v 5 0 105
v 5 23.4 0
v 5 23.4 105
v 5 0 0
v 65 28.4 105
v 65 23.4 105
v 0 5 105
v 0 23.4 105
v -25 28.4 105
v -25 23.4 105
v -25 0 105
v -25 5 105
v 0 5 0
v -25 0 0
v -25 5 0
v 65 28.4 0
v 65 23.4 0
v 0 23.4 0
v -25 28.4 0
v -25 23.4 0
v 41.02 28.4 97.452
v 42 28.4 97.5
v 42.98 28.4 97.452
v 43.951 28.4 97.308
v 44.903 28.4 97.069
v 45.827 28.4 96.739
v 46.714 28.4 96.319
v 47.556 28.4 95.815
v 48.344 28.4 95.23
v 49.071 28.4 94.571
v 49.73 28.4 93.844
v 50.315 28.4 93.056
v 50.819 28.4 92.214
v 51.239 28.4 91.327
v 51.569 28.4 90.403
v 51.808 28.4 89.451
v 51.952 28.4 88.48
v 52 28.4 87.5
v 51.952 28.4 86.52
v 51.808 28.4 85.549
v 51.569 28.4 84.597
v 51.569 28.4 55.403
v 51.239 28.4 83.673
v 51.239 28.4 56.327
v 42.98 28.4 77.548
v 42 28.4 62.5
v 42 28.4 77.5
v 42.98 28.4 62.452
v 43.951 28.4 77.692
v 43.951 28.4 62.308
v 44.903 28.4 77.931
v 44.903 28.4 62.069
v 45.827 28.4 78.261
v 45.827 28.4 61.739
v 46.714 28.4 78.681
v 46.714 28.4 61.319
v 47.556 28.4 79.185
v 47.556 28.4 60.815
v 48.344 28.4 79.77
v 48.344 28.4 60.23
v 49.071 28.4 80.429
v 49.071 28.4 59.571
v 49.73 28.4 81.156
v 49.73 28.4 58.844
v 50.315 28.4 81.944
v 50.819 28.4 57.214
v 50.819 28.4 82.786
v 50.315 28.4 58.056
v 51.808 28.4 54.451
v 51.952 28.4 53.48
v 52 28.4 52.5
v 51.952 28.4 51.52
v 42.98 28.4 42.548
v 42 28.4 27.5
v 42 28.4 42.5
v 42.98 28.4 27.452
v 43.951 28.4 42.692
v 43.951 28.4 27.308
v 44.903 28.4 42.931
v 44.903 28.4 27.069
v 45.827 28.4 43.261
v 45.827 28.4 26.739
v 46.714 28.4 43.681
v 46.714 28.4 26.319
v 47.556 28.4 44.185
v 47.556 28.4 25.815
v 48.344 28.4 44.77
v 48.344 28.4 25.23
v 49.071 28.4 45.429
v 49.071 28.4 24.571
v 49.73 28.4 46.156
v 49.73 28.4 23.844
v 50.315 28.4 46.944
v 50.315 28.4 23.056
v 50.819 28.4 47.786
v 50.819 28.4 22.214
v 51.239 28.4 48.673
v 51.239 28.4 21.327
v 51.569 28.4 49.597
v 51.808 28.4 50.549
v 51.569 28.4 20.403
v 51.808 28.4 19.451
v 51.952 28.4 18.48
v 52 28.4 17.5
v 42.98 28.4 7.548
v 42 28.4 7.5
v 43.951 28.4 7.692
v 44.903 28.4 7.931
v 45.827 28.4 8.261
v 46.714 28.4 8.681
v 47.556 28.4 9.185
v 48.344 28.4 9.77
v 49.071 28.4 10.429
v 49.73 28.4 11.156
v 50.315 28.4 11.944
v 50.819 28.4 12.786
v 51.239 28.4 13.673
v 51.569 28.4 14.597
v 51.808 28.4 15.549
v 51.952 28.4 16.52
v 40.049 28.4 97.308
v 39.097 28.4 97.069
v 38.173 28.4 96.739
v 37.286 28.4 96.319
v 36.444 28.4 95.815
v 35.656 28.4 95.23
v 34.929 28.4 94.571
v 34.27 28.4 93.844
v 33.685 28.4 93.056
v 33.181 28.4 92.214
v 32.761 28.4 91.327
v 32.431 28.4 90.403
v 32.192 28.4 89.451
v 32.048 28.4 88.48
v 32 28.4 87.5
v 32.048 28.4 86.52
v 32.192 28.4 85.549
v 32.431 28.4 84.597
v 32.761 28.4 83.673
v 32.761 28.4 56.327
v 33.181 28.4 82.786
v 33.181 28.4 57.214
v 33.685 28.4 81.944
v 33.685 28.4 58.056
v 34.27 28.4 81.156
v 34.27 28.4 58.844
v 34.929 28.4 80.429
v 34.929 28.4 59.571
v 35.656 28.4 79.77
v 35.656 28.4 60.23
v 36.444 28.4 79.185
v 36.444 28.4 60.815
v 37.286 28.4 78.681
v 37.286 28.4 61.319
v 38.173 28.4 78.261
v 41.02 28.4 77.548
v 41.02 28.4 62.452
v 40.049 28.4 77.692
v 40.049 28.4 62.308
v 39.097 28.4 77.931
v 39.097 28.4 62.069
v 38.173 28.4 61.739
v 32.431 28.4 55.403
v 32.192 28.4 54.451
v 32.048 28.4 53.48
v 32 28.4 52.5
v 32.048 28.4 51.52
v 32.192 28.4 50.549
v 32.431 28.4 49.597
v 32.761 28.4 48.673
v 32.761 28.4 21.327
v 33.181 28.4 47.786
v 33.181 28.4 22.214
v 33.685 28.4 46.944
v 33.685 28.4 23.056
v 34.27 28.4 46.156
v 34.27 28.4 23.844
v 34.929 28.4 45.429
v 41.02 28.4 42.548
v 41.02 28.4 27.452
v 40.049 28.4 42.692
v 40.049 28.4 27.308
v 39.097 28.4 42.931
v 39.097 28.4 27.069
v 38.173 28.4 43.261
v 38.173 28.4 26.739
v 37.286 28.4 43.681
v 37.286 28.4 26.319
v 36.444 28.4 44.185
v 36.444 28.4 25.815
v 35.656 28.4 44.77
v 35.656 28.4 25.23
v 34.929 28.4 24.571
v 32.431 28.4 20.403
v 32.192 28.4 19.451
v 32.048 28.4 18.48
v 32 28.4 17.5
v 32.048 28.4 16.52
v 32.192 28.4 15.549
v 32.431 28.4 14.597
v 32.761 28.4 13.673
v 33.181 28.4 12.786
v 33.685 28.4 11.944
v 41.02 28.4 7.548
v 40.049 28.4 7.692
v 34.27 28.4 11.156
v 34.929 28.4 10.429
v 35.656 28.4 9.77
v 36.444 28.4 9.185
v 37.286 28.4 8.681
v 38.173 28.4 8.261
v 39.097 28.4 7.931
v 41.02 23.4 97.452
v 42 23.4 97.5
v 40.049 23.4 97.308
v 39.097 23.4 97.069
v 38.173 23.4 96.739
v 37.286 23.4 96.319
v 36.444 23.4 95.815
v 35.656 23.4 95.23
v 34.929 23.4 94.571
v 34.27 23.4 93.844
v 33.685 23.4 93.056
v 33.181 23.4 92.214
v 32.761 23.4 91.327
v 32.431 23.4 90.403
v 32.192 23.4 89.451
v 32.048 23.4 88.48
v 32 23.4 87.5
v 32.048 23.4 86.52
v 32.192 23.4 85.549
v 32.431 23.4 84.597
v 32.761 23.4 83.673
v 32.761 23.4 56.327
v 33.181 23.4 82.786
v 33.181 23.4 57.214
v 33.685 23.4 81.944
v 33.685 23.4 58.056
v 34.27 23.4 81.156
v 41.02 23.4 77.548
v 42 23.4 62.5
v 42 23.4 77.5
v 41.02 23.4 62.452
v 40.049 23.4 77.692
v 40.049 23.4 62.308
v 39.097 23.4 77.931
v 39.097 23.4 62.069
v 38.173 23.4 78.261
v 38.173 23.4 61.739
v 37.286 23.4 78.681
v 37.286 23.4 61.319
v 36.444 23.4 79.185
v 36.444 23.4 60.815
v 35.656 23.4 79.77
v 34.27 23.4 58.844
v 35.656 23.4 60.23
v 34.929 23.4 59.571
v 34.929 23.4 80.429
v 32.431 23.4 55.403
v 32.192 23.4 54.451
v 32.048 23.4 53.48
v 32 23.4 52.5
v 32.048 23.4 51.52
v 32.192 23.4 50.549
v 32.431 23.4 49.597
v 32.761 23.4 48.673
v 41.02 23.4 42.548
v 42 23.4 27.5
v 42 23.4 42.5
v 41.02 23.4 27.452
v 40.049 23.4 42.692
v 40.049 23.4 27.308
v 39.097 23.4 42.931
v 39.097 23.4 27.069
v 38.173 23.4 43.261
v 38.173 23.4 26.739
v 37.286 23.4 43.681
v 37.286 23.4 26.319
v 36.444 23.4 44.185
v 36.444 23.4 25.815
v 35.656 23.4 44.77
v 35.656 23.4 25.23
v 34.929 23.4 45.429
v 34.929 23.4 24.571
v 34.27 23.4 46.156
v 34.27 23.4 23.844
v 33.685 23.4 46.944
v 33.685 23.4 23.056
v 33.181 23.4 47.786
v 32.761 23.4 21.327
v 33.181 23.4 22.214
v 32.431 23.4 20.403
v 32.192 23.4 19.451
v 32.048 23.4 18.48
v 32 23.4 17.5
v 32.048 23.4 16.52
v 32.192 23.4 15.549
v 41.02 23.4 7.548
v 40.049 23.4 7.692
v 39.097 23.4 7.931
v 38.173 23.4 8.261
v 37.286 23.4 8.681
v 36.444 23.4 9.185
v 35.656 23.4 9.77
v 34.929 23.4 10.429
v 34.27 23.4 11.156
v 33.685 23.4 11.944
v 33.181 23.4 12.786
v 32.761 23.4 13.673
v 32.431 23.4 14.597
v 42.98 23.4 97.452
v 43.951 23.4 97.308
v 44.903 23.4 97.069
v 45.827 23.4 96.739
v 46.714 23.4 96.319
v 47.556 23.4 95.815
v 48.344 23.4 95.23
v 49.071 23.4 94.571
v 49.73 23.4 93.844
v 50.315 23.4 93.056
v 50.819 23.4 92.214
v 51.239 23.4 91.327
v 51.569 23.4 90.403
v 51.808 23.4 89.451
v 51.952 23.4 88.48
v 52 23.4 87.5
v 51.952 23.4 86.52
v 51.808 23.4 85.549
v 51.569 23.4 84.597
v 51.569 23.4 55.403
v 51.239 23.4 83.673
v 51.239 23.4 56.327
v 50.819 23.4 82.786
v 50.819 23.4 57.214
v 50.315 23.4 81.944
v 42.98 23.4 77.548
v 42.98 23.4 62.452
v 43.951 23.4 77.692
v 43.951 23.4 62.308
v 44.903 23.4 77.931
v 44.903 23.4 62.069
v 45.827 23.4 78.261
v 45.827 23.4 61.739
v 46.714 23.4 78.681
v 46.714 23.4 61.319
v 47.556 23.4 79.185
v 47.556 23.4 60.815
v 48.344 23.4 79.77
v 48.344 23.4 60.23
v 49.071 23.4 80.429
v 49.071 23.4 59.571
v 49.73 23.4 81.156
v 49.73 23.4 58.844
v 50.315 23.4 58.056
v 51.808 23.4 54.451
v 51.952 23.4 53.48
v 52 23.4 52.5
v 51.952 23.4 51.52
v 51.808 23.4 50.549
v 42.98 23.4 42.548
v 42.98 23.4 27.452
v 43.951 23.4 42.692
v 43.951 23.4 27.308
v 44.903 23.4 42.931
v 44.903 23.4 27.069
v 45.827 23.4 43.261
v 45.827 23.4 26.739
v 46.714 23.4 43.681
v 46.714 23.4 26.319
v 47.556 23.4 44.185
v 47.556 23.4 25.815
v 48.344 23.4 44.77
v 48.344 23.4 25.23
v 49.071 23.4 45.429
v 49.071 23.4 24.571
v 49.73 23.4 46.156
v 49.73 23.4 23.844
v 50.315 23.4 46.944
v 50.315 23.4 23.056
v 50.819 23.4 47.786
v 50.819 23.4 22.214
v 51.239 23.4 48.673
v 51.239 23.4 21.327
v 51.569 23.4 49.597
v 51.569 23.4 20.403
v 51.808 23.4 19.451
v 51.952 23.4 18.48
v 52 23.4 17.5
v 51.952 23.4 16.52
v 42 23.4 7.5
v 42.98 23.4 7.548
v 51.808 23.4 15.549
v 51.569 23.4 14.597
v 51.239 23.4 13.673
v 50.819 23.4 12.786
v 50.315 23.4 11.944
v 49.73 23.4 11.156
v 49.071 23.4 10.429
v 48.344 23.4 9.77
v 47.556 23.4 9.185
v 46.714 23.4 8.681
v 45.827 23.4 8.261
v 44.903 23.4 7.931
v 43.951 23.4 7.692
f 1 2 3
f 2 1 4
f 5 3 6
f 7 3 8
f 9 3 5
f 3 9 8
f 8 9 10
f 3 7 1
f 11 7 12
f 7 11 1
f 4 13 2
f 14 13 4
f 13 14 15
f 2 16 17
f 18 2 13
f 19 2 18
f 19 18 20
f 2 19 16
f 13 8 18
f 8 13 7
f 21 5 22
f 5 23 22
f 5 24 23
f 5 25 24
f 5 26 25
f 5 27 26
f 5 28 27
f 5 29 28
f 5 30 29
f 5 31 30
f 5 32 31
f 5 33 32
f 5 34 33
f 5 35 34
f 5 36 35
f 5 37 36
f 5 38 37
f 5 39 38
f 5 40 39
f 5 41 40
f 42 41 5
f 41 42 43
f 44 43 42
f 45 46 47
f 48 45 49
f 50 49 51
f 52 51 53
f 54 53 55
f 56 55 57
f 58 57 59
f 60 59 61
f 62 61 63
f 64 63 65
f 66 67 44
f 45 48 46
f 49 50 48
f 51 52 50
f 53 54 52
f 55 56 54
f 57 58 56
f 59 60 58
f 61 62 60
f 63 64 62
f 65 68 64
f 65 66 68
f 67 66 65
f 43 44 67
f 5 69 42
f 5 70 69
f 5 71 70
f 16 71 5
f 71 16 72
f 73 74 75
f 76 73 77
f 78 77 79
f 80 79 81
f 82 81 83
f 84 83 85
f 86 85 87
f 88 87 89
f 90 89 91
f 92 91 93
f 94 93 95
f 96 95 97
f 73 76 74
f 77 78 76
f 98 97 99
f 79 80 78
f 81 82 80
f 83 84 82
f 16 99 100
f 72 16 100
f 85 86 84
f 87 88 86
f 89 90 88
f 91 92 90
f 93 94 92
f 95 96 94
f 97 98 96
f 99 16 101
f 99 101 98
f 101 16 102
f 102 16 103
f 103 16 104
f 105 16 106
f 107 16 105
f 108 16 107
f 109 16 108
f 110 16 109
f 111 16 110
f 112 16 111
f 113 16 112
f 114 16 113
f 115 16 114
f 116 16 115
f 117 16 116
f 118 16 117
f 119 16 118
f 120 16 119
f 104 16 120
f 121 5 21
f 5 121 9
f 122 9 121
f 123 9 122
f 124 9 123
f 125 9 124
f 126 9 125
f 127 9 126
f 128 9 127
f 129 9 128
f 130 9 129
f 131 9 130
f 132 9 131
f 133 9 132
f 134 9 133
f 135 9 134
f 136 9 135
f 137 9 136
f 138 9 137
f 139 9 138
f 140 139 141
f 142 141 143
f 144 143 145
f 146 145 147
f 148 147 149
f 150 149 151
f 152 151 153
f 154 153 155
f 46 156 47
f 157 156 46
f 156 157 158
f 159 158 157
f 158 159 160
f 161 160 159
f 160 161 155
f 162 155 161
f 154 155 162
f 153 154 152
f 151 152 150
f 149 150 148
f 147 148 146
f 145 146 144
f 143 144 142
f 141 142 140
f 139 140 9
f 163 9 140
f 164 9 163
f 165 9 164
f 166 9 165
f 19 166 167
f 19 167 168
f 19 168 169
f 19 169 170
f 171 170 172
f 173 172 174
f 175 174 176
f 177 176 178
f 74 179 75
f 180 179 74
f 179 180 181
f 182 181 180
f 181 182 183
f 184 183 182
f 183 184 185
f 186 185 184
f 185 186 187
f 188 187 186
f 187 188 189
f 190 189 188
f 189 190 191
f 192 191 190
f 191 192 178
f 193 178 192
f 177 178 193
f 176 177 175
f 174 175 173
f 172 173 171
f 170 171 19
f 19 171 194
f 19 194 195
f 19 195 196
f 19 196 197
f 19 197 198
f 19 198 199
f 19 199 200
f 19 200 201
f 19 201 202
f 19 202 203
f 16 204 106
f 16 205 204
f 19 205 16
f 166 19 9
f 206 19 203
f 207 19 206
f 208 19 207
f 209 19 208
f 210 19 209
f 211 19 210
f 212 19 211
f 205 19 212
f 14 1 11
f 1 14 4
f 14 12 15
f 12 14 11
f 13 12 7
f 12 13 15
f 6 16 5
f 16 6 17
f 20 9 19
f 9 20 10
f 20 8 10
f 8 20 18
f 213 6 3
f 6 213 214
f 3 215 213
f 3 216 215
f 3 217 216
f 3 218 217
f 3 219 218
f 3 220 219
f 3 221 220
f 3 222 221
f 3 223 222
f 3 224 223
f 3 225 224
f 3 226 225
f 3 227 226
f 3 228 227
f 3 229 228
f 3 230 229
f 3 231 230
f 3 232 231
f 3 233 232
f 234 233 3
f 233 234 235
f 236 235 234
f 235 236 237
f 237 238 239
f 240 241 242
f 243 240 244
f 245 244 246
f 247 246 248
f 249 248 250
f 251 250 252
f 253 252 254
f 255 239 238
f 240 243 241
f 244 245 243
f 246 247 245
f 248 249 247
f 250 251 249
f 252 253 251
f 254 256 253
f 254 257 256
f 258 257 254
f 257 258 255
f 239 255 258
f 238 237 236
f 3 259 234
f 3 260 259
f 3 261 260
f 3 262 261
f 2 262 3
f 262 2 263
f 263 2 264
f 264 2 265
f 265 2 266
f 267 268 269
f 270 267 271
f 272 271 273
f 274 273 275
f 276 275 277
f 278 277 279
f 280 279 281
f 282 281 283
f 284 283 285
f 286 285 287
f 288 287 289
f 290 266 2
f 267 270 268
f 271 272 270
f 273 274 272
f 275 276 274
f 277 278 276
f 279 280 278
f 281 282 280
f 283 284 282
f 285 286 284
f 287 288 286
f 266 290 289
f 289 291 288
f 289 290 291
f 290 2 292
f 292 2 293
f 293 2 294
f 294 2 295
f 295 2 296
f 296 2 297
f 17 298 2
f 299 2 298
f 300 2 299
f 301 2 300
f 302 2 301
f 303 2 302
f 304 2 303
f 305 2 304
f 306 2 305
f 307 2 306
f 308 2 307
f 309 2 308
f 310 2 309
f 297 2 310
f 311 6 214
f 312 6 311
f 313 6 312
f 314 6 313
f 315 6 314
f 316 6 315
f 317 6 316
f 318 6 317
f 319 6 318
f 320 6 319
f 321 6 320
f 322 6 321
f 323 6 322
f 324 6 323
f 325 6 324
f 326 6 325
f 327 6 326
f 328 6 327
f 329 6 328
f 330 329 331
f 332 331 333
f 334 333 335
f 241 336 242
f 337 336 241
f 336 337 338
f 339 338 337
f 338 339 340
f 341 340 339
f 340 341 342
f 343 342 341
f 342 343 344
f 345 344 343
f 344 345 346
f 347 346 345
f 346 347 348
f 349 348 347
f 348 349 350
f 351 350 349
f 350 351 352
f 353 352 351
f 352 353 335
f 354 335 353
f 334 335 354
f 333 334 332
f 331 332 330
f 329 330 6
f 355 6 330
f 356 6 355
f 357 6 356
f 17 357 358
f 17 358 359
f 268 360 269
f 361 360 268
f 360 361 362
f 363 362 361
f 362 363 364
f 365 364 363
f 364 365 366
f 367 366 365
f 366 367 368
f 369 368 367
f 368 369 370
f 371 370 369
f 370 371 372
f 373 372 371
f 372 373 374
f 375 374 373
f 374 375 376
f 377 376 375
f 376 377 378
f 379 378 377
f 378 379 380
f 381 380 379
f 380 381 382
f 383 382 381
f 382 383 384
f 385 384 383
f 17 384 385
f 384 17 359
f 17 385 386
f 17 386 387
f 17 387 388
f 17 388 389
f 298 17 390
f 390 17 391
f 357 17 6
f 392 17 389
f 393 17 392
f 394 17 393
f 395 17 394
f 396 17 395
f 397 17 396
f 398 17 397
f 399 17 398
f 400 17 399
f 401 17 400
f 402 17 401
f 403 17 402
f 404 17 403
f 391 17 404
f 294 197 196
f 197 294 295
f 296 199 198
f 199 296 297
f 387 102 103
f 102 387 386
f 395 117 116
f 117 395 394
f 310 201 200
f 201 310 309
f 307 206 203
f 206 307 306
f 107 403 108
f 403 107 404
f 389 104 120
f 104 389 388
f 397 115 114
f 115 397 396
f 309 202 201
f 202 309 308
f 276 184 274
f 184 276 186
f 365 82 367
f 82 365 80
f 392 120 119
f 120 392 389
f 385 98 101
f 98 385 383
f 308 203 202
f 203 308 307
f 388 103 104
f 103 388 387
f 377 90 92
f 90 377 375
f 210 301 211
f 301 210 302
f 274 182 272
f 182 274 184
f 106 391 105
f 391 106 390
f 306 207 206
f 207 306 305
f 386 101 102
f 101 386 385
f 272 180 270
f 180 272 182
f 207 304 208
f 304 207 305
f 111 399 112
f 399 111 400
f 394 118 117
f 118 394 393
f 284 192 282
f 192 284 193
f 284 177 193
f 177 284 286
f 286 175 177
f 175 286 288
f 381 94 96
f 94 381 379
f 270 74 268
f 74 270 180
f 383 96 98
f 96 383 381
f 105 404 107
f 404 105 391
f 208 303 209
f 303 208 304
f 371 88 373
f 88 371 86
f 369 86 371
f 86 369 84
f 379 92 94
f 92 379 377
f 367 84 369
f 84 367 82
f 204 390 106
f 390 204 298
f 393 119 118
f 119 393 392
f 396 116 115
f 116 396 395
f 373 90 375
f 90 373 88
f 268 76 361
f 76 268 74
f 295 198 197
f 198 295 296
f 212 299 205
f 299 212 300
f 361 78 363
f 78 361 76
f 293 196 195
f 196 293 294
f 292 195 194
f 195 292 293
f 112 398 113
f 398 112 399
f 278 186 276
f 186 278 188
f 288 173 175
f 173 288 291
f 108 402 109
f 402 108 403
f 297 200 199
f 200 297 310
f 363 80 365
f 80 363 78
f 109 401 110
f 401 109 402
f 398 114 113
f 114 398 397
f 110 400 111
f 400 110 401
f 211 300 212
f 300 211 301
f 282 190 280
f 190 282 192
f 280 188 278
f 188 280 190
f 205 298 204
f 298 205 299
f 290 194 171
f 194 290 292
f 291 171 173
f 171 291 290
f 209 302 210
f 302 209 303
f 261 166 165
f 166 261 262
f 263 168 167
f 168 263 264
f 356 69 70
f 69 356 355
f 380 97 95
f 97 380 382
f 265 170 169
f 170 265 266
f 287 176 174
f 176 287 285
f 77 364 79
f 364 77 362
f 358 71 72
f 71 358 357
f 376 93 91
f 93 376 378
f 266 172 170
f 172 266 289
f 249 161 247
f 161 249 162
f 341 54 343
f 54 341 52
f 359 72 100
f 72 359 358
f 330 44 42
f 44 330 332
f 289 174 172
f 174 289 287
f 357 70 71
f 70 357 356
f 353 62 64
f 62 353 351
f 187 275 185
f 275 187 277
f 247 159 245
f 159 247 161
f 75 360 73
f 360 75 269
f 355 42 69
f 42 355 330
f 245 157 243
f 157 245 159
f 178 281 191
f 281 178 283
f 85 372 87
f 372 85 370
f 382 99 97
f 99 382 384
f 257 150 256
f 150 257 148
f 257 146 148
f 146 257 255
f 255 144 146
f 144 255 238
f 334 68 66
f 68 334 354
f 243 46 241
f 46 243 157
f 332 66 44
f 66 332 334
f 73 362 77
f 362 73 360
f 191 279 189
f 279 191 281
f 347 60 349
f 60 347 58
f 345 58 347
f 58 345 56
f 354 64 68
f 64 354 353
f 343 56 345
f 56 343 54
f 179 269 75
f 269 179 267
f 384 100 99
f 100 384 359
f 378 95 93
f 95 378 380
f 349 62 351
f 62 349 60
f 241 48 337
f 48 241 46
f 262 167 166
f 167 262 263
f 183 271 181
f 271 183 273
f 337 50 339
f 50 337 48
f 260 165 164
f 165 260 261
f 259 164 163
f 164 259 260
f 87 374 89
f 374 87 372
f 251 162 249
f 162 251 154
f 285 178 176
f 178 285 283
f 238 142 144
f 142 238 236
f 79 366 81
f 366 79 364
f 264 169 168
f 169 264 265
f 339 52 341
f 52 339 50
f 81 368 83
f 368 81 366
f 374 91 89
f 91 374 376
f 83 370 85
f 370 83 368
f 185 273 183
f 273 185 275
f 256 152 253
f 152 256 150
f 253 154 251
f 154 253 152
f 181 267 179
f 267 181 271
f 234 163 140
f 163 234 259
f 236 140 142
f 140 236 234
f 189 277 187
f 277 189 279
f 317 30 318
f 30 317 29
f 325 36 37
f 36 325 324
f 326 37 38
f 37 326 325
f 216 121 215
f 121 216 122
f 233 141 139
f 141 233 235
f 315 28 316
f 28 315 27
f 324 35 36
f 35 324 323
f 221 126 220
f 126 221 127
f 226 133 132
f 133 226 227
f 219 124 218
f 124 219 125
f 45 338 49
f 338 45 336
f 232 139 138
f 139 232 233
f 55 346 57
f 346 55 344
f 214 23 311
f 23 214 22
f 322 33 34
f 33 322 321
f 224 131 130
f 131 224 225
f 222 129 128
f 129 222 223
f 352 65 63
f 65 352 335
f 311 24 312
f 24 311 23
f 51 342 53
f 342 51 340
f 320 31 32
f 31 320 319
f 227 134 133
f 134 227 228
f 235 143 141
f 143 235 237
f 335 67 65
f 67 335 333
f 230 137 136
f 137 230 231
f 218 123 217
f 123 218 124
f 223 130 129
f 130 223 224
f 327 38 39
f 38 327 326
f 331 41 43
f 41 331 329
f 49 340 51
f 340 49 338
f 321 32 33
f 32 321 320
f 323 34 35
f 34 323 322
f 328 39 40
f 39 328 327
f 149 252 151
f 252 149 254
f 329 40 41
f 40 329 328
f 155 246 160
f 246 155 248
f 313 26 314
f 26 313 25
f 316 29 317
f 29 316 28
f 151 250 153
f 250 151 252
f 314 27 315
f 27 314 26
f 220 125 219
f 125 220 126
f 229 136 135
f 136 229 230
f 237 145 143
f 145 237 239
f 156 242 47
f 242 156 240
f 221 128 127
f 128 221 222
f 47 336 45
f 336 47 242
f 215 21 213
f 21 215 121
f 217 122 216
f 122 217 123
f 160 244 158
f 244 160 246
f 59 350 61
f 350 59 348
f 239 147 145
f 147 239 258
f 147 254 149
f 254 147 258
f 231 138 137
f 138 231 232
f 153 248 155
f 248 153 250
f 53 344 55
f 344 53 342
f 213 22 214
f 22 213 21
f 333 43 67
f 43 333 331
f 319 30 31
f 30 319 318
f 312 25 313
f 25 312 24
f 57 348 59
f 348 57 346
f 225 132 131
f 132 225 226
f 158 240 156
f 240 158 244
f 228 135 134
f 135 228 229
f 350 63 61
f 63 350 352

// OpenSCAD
// Dimensions (in millimeters)
spine_x_min = 0;
spine_x_max = 5;
spine_y_min = 0;
spine_y_max = 28.4;

bottom_jaw_x_min = -25;
bottom_jaw_x_max = 5;
bottom_jaw_y_min = 0;
bottom_jaw_y_max = 5;

top_jaw_x_min = -25;
top_jaw_x_max = 65;
top_jaw_y_min = 23.4;
top_jaw_y_max = 28.4;

extrusion_length = 105; // along Z

hole_diameter = 20;
hole_radius = hole_diameter / 2;
hole_x = 42;
hole_z_positions = [17.5, 52.5, 87.5];
hole_y_center = (top_jaw_y_min + top_jaw_y_max) / 2;
hole_y_height = top_jaw_y_max - top_jaw_y_min + 1;

// Build the clamp with holes
difference() {
    union() {
        // Spine (back part contacting shelf)
        translate([spine_x_min, spine_y_min, 0])
            cube([spine_x_max - spine_x_min, spine_y_max - spine_y_min, extrusion_length]);
        
        // Bottom jaw (lower part of shelf clamp)
        translate([bottom_jaw_x_min, bottom_jaw_y_min, 0])
            cube([bottom_jaw_x_max - bottom_jaw_x_min, bottom_jaw_y_max - bottom_jaw_y_min, extrusion_length]);
        
        // Top jaw and arm (upper part and extending forward)
        translate([top_jaw_x_min, top_jaw_y_min, 0])
            cube([top_jaw_x_max - top_jaw_x_min, top_jaw_y_max - top_jaw_y_min, extrusion_length]);
    }
    
    // Three holes through the arm along Y direction
    for (z_pos = hole_z_positions) {
        translate([hole_x, hole_y_center, z_pos])
            rotate([90, 0, 0])
            cylinder(h = hole_y_height, r = hole_radius, $fn = 64, center = true);
    }
}
